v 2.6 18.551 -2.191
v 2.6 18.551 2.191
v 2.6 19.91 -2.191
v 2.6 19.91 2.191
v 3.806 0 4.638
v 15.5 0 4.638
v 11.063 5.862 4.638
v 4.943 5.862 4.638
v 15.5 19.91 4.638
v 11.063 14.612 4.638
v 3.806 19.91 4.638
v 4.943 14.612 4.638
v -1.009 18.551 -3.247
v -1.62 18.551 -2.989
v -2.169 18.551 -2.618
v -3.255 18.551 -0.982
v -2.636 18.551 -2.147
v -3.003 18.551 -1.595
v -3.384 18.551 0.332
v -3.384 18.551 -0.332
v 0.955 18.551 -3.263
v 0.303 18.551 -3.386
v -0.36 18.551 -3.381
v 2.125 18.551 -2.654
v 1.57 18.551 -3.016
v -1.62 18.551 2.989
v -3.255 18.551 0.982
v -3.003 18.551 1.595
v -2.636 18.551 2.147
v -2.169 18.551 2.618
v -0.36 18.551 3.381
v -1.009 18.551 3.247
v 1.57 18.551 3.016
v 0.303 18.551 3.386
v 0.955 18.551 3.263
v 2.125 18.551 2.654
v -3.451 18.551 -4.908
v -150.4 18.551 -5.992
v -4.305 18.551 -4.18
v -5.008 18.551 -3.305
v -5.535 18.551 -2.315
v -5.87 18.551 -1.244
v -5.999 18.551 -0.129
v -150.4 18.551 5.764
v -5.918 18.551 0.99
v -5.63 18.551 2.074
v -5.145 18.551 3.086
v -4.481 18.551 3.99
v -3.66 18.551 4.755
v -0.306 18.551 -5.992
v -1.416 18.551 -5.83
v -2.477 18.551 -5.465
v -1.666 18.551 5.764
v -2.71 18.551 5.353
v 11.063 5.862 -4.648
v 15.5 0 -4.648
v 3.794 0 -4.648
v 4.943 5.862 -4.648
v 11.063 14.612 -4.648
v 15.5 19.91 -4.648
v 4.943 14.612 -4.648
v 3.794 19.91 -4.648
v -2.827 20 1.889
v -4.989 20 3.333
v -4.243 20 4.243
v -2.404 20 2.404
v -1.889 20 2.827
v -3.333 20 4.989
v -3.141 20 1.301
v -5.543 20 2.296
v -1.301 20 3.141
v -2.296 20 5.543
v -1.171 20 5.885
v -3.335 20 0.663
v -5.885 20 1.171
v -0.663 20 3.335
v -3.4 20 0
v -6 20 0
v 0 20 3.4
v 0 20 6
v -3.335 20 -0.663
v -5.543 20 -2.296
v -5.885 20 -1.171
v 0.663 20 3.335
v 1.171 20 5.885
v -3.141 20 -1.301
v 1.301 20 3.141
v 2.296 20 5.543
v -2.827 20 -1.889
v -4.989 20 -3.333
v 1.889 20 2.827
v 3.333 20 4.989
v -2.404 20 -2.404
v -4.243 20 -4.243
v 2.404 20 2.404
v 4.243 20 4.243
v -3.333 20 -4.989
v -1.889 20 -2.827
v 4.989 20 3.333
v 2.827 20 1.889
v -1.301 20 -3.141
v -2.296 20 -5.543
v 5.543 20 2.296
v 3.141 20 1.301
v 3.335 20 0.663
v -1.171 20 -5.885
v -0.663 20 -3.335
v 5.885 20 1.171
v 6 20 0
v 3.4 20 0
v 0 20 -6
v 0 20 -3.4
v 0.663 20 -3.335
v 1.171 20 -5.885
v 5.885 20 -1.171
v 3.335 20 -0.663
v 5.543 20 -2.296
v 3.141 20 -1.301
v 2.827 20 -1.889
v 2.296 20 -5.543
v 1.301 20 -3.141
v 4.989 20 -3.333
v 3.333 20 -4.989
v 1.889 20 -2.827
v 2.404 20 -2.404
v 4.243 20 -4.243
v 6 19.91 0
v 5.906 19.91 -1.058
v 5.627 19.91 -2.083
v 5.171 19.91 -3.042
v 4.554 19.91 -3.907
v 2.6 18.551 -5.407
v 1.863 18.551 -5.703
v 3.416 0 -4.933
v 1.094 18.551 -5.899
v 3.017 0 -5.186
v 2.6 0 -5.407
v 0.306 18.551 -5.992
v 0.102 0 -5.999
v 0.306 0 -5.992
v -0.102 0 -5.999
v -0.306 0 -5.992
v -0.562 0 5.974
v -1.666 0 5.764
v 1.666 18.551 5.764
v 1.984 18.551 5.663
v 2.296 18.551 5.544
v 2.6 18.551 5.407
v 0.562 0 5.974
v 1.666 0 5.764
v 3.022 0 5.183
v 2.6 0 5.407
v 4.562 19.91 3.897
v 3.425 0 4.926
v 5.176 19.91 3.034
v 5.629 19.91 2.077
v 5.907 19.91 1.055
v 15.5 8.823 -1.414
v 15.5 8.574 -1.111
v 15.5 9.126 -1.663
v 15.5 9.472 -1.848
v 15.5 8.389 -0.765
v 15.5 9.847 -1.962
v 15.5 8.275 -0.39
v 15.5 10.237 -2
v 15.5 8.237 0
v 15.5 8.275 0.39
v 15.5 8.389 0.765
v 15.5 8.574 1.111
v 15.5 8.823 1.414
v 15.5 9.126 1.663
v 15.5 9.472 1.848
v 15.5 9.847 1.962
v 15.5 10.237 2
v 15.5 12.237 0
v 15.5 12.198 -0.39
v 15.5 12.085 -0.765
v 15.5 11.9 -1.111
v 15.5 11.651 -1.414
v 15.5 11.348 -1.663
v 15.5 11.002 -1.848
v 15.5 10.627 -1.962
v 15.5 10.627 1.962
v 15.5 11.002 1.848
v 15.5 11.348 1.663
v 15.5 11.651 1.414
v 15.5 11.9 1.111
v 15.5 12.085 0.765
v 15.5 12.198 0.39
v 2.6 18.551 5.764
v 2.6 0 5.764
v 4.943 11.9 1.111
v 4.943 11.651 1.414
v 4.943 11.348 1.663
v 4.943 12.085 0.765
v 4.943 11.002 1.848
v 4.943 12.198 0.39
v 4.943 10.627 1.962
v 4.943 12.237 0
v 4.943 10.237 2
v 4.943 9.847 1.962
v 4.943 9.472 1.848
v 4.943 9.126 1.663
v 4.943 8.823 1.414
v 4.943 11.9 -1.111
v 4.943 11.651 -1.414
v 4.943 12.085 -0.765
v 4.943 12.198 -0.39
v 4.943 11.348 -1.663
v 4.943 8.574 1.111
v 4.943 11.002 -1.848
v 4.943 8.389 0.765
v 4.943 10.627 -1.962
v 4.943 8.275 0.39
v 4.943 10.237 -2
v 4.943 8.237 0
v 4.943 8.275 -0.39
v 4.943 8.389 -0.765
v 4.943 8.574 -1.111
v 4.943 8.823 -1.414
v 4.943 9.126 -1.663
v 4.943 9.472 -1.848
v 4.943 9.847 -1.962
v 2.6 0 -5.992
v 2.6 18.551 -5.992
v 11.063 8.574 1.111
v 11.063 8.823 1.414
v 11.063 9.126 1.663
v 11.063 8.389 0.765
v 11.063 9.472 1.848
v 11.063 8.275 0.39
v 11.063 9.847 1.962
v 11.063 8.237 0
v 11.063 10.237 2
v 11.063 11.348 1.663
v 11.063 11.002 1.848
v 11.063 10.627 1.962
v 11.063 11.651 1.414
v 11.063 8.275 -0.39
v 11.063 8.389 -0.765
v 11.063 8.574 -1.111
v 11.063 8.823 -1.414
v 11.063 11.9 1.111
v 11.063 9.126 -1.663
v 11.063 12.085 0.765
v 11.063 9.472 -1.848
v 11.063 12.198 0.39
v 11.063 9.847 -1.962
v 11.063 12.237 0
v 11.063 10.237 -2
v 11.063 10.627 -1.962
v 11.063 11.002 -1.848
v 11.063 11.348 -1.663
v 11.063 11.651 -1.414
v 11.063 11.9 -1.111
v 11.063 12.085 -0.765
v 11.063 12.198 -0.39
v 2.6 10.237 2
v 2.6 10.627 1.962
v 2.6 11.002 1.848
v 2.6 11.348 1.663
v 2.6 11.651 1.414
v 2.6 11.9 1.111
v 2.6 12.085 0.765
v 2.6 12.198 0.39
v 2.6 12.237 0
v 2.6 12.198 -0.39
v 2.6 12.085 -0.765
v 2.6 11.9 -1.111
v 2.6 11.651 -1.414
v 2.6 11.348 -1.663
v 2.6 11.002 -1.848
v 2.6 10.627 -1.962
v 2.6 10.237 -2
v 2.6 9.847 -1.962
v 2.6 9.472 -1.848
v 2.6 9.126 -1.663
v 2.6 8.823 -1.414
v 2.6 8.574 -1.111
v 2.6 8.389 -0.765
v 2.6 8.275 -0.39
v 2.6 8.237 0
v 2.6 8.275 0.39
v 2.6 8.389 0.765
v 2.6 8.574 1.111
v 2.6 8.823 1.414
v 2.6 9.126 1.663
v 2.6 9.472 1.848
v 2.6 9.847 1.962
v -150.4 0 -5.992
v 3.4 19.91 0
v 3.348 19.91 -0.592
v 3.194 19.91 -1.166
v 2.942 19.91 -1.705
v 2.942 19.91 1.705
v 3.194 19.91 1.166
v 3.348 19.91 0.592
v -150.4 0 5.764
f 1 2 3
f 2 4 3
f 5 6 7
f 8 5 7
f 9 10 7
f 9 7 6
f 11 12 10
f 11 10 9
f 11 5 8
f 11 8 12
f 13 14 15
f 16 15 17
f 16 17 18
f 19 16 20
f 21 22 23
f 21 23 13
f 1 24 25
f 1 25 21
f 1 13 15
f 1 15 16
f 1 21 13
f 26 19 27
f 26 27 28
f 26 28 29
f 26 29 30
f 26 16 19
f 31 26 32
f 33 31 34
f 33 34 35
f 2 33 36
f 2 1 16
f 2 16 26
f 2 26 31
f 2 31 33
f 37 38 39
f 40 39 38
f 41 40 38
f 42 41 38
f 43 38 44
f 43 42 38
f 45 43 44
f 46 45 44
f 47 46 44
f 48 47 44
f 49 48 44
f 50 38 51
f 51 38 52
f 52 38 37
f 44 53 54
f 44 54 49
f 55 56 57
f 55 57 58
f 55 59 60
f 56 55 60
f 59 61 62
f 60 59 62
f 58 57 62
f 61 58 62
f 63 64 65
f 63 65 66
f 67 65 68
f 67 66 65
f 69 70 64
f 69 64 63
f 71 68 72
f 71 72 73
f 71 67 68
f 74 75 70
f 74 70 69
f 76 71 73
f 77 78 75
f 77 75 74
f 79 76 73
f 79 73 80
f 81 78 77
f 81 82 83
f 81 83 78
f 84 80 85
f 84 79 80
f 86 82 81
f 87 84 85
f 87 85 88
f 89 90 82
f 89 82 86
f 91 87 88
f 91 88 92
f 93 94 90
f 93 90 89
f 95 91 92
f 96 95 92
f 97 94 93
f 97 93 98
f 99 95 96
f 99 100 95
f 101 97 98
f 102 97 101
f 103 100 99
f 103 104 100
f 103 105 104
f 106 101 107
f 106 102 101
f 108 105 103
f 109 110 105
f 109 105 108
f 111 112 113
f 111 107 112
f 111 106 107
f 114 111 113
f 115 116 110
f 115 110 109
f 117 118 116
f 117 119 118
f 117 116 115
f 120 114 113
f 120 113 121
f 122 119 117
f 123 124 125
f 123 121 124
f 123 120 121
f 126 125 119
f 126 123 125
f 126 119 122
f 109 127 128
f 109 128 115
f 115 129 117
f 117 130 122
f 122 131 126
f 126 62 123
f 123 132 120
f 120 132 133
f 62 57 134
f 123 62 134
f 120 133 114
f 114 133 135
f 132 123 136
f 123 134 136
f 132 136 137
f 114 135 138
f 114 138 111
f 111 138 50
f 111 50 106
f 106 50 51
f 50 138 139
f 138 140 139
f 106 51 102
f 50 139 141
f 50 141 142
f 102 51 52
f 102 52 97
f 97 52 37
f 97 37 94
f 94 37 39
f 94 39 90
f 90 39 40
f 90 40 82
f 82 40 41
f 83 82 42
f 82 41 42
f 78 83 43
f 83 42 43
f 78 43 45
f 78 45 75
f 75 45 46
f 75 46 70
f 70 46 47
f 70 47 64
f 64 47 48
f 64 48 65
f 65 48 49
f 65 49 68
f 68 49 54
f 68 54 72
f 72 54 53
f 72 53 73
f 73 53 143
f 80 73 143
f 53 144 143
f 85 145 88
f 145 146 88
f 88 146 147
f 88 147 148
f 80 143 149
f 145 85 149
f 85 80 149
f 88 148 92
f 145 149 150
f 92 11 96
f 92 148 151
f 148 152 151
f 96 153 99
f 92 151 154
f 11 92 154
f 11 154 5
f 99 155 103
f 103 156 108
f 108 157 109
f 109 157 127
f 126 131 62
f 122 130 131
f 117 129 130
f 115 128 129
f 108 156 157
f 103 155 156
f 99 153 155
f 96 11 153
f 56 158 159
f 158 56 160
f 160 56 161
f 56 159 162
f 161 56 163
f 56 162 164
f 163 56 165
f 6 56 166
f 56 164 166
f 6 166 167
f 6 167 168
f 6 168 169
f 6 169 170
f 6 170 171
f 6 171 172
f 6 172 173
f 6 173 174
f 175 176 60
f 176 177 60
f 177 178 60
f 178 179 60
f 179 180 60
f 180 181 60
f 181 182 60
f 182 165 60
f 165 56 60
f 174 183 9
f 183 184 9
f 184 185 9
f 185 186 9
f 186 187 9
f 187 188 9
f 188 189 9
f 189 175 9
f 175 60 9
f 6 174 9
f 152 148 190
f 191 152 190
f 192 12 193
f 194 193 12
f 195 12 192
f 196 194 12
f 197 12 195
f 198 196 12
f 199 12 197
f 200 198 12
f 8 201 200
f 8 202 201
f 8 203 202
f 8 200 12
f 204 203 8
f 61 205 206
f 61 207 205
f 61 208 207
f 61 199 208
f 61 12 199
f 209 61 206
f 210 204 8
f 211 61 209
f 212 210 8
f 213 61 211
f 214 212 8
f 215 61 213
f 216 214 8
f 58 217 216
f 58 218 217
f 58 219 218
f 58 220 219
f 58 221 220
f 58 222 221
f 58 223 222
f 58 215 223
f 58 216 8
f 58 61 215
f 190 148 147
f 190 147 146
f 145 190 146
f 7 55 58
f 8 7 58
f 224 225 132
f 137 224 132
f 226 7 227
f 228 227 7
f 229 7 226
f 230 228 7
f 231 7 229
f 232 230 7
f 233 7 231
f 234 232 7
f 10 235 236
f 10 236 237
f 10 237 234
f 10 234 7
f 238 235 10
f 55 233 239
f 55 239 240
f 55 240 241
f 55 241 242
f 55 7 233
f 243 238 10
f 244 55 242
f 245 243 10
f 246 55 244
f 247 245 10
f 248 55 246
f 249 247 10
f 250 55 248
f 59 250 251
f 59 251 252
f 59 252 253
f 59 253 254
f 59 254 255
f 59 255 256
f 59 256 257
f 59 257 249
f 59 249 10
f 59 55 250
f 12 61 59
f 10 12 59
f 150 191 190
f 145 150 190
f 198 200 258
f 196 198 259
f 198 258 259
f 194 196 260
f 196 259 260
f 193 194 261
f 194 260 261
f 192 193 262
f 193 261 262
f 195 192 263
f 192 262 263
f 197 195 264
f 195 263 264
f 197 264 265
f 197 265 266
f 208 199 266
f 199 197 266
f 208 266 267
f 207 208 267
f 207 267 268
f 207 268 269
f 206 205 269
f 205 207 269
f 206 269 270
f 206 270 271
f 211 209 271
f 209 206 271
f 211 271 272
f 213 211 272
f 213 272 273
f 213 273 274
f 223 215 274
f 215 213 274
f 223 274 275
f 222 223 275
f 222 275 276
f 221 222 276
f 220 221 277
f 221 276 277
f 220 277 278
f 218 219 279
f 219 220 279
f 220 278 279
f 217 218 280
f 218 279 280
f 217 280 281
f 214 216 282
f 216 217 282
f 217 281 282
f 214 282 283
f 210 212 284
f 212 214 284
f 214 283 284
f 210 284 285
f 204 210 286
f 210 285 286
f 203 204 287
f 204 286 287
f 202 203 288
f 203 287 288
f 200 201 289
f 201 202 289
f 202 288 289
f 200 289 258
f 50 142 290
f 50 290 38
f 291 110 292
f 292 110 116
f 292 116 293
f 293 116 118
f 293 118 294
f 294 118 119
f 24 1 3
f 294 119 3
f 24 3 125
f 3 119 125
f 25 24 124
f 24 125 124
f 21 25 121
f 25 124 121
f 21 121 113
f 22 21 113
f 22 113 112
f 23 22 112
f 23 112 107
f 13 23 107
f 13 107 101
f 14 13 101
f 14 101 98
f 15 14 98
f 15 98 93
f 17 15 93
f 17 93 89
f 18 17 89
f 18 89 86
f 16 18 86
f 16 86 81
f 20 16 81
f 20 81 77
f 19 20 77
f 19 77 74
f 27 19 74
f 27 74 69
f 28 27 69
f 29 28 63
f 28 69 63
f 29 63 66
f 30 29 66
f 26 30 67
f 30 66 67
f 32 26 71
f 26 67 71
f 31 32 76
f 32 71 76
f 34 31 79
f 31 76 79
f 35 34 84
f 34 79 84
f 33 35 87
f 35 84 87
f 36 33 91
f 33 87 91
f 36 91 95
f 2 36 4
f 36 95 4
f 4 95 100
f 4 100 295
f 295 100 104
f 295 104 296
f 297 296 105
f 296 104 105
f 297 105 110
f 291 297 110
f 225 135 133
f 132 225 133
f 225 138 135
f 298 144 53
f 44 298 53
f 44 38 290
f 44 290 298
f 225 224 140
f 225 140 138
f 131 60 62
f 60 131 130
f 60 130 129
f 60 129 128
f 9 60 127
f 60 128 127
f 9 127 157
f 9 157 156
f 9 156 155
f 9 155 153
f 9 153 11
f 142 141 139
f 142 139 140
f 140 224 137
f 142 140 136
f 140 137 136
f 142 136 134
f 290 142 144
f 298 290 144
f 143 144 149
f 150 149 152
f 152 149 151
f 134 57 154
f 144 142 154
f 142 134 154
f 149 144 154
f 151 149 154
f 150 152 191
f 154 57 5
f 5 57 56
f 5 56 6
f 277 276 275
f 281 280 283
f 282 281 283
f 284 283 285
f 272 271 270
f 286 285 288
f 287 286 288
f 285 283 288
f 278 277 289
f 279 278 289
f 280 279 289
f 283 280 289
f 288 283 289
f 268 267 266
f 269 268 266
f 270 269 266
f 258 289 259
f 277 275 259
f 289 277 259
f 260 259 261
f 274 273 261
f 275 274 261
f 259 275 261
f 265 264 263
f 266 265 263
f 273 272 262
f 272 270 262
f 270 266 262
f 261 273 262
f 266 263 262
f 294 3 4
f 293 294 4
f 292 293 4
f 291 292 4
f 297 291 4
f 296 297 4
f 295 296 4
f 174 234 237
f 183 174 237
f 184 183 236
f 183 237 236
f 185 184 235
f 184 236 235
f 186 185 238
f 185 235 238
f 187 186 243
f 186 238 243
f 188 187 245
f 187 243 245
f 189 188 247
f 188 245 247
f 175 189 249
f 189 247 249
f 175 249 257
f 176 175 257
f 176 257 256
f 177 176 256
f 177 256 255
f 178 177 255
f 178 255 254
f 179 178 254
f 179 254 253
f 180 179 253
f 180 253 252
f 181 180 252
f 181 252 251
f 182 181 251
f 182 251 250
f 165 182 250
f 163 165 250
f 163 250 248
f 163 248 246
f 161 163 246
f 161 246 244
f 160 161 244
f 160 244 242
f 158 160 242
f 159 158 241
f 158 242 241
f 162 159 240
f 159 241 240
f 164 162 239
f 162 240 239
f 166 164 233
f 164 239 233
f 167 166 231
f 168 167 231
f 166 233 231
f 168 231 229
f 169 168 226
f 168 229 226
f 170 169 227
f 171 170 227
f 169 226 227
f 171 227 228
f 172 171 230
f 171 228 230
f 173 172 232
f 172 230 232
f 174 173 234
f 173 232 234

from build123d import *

# Parameters (mm, degrees)
SKETCH1_R               = 6
BOSS_EXTRUDE1_DEPTH     = 20
SKETCH2_R               = 3.4
CUT_EXTRUDE1_DEPTH      = 13.55
SKETCH5_W               = 1.550685087
SKETCH5_H               = 7.184215806
BOSS_EXTRUDE2_DEPTH     = 13.55
SKETCH7_W               = 9.286501956
SKETCH7_H               = 19.909960041
BOSS_EXTRUDE3_DEPTH     = 12.9
CUT_EXTRUDE2_DEPTH      = 1
CUT_EXTRUDE2_DEPTH_BACK = 13.55
SKETCH6_R               = 2
CUT_EXTRUDE3_DEPTH      = 10
CUT_EXTRUDE3_DEPTH_BACK = 10
SKETCH11_W              = 11.756176319
SKETCH11_H              = 18.551417714
BOSS_EXTRUDE4_DEPTH     = 153


with BuildPart() as part:
    # Sketch1 → Boss-Extrude1 (new body)
    with BuildSketch(Plane(origin=(0, 0, 0), x_dir=(1, 0, 0), z_dir=(0, 1, 0))):
        Circle(SKETCH1_R)
    extrude(amount=BOSS_EXTRUDE1_DEPTH)

    # Sketch2 → Cut-Extrude1 (cut)
    with BuildSketch(Plane(origin=(0, 20, 0), x_dir=(1, 0, 0), z_dir=(0, 1, 0))):
        Circle(SKETCH2_R)
    extrude(amount=-CUT_EXTRUDE1_DEPTH, mode=Mode.SUBTRACT)

    # Sketch5 → Boss-Extrude2 (add)
    with BuildSketch(Plane(origin=(0, 18.26, 0), x_dir=(1, 0, 0), z_dir=(0, 1, 0))):
        with Locations((3.375342544, 0.020519704)):
            Rectangle(SKETCH5_W, SKETCH5_H)
    extrude(amount=-BOSS_EXTRUDE2_DEPTH)

    # Sketch7 → Boss-Extrude3 (add)
    with BuildSketch(Plane.ZY.offset(-2.6)):
        with Locations((-0.005218197, 9.954980021)):
            Rectangle(SKETCH7_W, SKETCH7_H)
    extrude(amount=-BOSS_EXTRUDE3_DEPTH)

    # Sketch6 → Cut-Extrude2 (cut, two sides: drawn at the far end of the back side and taken through both)
    with BuildSketch(Plane.ZY.offset(-2.6).offset(-CUT_EXTRUDE2_DEPTH_BACK)):
        with Locations((0, 10.236925537)):
            Circle(SKETCH6_R)
    extrude(amount=CUT_EXTRUDE2_DEPTH + CUT_EXTRUDE2_DEPTH_BACK, mode=Mode.SUBTRACT)

    # Sketch9 → Cut-Extrude3 (cut, two sides: drawn at the far end of the back side and taken through both)
    with BuildSketch(Plane.XY.offset(-CUT_EXTRUDE3_DEPTH_BACK)):
        Polygon((11.063430227, 10.236925537), (11.063430227, 5.861925537), (4.943430227, 5.861925537), (4.943430227, 10.236925537), (4.943430227, 14.611925537), (11.063430227, 14.611925537), align=None)
    extrude(amount=CUT_EXTRUDE3_DEPTH + CUT_EXTRUDE3_DEPTH_BACK, mode=Mode.SUBTRACT)

    # Sketch11 → Boss-Extrude4 (add)
    with BuildSketch(Plane.ZY.offset(-2.6)):
        with Locations((-0.114099009, 9.275708857)):
            Rectangle(SKETCH11_W, SKETCH11_H)
    extrude(amount=BOSS_EXTRUDE4_DEPTH)


solid = part.part
